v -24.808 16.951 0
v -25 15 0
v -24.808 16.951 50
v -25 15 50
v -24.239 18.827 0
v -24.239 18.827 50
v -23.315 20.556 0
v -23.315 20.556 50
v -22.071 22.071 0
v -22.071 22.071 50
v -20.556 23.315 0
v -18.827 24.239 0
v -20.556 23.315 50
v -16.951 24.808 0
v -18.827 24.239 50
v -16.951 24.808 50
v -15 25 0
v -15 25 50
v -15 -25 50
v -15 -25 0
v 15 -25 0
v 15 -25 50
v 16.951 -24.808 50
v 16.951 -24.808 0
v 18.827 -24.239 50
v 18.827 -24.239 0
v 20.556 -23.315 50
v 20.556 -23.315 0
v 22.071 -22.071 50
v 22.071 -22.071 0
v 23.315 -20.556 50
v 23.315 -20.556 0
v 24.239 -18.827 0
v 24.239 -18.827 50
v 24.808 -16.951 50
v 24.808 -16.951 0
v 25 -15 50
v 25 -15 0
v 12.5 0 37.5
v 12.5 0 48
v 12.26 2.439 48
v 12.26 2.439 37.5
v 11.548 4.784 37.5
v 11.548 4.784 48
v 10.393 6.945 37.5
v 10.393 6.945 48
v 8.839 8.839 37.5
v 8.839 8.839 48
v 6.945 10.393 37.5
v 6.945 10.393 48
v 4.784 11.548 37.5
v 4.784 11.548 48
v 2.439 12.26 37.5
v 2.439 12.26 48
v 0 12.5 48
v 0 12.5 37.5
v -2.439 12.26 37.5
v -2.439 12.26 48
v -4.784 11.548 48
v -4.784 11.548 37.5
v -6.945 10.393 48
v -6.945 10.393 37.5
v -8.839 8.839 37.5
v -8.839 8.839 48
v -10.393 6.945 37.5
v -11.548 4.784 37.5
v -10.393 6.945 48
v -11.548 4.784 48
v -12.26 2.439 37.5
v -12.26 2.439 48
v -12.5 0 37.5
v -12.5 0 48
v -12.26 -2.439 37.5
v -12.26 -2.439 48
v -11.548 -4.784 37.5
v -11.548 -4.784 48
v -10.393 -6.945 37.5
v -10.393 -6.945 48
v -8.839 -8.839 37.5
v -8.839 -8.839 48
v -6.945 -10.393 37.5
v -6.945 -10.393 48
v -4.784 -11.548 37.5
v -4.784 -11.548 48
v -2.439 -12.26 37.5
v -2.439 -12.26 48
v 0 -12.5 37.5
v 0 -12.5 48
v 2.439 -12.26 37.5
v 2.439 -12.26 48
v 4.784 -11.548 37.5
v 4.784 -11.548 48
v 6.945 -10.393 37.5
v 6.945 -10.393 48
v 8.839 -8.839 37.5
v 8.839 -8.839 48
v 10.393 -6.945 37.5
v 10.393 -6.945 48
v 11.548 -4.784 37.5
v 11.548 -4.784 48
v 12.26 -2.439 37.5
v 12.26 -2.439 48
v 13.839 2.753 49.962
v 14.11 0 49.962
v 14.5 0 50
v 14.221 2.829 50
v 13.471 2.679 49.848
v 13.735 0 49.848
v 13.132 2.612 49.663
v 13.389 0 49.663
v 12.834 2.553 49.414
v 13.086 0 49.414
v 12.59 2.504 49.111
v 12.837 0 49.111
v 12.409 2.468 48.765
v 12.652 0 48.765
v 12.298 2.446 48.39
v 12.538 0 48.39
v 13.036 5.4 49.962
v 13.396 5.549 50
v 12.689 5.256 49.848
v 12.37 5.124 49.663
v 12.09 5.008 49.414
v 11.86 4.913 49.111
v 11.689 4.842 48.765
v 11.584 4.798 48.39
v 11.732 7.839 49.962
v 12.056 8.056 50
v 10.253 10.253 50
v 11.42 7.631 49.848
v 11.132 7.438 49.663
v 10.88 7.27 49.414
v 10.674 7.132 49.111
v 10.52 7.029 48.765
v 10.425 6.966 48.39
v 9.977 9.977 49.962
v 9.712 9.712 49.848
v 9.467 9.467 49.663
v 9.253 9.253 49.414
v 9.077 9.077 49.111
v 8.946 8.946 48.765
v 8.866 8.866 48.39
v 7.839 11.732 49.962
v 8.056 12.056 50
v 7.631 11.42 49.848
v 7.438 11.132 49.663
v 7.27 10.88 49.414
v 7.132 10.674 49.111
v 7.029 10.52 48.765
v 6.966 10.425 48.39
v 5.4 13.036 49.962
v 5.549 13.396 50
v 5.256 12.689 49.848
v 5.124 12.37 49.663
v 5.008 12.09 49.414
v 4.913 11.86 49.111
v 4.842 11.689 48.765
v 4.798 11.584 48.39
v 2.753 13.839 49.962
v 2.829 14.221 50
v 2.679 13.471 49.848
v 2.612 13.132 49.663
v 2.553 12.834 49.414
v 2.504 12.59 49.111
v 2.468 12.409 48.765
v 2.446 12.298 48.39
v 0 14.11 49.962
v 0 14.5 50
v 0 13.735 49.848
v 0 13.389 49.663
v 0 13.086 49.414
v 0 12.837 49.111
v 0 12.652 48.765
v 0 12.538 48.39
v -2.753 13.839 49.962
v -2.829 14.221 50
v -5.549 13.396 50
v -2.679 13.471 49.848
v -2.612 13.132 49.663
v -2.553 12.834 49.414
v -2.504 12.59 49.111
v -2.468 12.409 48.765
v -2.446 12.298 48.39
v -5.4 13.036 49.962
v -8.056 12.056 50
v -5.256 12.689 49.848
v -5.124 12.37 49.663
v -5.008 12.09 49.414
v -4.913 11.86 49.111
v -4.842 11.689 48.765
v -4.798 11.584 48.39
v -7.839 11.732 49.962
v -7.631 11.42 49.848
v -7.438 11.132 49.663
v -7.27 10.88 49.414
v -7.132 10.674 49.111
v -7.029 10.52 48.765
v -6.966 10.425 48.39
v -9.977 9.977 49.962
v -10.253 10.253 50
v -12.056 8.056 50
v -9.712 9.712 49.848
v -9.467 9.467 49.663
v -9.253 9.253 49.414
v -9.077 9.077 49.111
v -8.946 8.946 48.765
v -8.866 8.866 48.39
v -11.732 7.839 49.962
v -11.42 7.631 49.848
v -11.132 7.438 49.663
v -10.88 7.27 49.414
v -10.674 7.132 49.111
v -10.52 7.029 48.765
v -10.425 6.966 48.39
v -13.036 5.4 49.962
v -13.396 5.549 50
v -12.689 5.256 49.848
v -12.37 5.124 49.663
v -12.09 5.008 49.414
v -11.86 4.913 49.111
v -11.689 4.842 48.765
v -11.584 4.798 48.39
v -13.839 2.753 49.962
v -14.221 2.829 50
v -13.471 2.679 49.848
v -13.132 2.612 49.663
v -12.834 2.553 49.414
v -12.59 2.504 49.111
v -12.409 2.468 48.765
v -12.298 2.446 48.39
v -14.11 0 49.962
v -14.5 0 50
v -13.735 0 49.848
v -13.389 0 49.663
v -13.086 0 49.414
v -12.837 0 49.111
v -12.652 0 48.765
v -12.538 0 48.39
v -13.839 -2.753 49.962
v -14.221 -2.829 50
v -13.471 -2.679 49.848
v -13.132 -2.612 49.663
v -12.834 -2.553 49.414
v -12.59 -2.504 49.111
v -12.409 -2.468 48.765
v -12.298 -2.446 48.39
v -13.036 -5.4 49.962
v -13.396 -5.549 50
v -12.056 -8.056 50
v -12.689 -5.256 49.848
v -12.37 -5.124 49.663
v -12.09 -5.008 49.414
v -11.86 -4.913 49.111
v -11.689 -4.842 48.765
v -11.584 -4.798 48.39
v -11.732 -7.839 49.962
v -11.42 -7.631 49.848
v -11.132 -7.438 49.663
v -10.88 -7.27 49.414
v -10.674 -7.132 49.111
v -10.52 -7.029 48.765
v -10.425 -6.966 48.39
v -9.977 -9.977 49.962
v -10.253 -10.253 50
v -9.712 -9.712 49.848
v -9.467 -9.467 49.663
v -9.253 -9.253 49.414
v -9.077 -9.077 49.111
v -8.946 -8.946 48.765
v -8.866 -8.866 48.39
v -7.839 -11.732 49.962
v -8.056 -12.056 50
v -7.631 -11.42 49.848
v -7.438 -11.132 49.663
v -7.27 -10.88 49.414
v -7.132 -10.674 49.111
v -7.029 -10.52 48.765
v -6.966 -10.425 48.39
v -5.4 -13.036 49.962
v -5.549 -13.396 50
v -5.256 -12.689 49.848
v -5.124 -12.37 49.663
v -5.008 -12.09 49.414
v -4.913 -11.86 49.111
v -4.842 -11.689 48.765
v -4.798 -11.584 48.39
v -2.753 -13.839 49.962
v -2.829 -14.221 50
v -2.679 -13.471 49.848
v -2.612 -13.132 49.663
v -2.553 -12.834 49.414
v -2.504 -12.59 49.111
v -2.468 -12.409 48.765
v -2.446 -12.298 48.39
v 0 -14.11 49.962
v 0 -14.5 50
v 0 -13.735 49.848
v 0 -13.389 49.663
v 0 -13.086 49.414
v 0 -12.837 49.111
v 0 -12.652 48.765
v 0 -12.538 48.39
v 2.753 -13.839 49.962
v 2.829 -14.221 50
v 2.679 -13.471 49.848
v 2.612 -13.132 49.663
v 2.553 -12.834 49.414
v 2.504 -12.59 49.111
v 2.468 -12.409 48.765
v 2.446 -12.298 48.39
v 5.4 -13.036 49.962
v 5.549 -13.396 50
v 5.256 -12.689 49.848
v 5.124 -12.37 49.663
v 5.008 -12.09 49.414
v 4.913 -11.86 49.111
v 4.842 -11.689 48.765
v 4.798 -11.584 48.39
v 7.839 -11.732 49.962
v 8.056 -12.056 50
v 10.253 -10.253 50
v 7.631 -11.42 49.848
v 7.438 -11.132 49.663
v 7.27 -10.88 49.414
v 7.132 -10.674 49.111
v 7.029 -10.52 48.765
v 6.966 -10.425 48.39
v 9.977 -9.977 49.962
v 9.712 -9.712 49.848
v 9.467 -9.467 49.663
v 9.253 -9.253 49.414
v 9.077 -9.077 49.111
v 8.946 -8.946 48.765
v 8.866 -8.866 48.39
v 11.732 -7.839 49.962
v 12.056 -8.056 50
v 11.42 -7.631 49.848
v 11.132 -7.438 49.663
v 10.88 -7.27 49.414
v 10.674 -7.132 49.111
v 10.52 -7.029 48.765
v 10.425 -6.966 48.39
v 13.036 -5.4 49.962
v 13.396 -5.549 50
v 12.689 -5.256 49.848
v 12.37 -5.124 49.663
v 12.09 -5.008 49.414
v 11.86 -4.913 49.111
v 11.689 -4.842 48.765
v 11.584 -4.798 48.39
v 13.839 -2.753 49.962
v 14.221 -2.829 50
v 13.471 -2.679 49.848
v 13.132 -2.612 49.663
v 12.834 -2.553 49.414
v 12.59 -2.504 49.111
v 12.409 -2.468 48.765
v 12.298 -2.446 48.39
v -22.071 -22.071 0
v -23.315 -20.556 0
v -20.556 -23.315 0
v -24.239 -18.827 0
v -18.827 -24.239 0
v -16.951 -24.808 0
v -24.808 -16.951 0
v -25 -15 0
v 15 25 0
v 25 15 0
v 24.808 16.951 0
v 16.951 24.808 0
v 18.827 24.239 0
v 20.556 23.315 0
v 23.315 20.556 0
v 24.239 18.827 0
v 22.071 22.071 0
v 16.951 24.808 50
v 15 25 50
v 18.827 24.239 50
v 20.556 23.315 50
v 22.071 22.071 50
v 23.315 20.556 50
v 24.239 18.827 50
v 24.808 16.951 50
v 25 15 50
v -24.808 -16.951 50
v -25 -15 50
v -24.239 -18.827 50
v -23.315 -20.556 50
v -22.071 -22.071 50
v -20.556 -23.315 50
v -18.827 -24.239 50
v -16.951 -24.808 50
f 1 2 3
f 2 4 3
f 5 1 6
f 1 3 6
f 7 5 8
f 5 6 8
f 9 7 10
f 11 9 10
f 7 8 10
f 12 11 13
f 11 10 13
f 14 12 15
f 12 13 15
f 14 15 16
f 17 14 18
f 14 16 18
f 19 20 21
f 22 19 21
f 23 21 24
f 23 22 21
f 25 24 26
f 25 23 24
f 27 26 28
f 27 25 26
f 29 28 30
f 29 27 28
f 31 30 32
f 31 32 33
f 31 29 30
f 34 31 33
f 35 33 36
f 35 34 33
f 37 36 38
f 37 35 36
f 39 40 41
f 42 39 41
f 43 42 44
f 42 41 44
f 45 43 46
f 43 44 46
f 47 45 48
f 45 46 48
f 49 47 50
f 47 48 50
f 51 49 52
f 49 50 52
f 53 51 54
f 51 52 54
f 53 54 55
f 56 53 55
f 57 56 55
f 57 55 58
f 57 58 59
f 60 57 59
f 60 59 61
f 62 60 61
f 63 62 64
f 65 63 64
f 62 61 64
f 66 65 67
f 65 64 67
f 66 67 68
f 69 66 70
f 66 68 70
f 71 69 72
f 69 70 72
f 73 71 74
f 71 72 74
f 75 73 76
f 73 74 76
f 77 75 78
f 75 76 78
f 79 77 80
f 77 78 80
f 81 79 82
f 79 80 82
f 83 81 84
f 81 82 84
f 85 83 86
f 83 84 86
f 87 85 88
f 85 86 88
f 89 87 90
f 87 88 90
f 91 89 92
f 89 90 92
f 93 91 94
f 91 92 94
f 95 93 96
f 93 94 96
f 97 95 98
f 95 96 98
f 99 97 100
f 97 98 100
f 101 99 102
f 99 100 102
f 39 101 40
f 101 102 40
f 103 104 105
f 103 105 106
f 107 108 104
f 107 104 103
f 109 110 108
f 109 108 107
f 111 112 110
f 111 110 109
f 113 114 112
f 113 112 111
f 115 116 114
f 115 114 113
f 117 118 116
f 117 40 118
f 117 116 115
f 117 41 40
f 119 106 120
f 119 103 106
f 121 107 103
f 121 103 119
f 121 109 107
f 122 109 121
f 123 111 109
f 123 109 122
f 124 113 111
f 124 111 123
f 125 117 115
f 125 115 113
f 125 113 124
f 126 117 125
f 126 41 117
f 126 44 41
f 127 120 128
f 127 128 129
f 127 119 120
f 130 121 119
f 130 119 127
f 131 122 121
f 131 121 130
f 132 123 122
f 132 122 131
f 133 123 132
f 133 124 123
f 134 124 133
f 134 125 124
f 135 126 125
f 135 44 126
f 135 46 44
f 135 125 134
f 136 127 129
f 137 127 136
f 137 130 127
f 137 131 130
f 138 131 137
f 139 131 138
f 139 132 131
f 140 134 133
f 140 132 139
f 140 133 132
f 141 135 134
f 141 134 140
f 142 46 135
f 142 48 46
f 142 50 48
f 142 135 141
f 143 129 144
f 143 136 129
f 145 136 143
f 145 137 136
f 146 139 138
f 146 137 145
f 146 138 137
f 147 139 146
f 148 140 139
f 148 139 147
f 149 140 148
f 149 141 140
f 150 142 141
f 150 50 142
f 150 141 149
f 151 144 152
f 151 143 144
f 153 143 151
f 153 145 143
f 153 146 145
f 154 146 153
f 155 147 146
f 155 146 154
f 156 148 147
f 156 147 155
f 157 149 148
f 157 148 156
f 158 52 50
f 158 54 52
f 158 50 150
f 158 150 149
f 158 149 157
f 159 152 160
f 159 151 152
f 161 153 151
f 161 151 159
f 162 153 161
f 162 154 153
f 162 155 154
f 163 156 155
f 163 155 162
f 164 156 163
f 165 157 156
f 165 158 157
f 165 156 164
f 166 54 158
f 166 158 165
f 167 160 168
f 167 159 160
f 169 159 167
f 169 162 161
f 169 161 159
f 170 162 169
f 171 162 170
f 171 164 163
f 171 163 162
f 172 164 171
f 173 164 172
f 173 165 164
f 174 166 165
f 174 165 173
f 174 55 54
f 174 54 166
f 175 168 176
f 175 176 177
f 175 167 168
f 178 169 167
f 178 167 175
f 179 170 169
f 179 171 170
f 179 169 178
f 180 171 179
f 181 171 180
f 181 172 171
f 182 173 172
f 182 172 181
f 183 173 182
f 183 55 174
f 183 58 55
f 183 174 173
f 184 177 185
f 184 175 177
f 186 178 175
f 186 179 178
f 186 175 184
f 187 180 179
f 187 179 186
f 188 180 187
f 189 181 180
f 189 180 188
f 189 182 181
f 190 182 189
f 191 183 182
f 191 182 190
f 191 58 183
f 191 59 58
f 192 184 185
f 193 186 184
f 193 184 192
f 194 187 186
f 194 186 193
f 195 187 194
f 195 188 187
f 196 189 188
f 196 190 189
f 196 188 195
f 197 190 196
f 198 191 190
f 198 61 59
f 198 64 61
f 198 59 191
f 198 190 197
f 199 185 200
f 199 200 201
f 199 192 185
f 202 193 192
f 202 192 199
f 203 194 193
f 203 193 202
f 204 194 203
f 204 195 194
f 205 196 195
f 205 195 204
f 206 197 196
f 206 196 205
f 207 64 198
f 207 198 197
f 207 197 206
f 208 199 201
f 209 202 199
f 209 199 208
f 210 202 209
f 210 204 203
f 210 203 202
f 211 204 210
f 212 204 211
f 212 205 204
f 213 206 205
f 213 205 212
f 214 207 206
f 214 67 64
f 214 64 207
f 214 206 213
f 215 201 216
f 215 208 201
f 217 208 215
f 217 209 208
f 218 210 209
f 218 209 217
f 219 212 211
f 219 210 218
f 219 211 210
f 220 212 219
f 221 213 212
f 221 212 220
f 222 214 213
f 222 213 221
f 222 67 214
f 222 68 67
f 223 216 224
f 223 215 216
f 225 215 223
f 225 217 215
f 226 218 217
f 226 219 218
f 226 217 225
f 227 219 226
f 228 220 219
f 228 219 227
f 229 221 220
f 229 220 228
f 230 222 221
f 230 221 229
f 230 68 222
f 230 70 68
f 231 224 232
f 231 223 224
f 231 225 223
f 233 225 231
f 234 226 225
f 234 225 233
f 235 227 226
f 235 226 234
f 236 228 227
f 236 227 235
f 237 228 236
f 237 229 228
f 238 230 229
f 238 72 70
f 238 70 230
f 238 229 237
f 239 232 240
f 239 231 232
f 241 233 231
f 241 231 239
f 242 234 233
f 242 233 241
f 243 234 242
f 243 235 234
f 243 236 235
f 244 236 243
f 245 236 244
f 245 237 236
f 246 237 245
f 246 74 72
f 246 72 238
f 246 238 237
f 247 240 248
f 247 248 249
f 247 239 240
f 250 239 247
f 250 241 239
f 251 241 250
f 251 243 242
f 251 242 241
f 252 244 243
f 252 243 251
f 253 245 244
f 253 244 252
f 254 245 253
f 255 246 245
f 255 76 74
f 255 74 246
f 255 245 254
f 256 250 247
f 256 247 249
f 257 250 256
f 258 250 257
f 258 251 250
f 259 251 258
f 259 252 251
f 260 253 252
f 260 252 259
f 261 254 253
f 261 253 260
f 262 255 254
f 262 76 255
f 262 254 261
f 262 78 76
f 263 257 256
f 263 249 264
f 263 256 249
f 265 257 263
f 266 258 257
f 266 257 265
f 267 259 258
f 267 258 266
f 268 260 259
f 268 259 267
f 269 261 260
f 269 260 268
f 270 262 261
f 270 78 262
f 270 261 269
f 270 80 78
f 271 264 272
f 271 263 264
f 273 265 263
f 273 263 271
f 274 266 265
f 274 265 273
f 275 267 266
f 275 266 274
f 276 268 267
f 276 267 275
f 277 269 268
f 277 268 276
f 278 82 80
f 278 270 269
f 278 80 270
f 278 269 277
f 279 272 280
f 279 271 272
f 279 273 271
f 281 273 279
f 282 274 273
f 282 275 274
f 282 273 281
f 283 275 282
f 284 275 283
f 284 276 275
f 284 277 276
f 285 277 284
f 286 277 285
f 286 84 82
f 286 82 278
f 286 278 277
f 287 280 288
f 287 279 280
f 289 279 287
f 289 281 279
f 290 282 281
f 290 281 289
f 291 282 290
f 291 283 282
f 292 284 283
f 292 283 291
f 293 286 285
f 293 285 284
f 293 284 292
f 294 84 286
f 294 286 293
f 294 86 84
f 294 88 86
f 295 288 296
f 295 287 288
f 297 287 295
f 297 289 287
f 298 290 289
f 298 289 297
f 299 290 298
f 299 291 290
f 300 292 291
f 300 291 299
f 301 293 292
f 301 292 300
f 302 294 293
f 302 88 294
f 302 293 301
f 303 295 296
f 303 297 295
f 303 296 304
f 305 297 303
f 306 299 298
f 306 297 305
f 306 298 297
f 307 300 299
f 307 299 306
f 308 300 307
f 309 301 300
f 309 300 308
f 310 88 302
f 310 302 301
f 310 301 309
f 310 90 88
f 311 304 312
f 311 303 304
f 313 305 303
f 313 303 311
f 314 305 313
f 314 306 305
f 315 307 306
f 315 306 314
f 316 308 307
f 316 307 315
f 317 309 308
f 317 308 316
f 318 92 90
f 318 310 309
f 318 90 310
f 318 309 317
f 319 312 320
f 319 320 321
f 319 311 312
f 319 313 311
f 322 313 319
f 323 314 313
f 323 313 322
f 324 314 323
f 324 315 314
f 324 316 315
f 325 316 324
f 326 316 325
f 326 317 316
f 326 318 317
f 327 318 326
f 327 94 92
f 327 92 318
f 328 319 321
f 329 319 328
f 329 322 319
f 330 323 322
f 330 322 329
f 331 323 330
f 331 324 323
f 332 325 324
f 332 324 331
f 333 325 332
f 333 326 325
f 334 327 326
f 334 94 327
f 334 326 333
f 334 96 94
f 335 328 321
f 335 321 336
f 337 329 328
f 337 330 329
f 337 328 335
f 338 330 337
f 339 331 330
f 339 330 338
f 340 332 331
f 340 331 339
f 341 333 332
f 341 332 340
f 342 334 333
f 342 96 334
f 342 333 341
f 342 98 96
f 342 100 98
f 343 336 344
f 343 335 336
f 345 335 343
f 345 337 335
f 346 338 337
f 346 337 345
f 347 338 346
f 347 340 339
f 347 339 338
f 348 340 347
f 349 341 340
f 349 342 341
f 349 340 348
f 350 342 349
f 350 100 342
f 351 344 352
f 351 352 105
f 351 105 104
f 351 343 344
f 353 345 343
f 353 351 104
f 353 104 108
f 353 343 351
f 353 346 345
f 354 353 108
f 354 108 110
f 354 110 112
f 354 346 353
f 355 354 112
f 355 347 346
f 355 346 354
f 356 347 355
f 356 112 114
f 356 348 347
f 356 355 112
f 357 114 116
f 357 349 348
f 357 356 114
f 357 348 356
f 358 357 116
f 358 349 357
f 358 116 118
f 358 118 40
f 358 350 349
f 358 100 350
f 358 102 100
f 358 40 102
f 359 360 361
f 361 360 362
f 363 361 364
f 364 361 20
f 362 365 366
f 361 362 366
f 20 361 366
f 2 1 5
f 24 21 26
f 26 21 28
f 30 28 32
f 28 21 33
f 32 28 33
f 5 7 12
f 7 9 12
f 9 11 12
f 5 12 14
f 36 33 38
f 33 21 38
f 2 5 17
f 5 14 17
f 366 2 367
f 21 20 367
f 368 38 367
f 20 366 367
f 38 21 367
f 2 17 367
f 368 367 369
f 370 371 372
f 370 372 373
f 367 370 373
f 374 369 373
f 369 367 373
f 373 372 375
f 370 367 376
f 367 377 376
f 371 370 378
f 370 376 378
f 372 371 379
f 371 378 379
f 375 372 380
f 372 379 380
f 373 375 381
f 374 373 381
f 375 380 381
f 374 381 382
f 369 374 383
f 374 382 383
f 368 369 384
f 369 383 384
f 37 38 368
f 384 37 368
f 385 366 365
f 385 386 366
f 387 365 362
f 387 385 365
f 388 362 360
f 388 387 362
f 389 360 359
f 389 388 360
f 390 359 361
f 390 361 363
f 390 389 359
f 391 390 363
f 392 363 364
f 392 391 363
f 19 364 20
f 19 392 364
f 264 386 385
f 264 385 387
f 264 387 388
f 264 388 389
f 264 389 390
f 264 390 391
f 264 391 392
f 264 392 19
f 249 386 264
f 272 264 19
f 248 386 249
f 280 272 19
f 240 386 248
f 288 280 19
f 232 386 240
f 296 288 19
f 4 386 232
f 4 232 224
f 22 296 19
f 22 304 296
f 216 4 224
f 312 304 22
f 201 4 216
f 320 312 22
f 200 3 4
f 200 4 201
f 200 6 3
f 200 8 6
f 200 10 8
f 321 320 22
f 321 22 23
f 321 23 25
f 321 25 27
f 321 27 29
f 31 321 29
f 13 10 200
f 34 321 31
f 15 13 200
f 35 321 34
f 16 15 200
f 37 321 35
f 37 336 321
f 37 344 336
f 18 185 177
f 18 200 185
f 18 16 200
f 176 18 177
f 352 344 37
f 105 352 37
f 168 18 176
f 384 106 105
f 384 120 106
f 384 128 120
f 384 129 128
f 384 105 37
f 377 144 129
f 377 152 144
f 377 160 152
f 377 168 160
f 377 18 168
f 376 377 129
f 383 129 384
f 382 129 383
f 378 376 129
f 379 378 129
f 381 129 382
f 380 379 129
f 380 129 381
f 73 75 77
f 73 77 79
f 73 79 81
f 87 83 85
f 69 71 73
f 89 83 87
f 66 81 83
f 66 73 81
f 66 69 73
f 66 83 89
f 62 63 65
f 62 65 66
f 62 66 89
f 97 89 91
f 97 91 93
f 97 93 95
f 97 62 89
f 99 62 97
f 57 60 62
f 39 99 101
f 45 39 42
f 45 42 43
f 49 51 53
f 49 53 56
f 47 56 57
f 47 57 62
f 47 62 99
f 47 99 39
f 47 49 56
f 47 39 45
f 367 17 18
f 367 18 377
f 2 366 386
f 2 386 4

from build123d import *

# Parameters (mm, degrees)
SKETCH_W     = 50
SKETCH_H     = 50
PAD_DEPTH    = 50
SKETCH001_R  = 12.5
POCKET_DEPTH = 12.5
FILLET_R     = 10
FILLET001_R  = 2


with BuildPart() as part:
    # Sketch → Pad (new body)
    with BuildSketch(Plane.XY):
        Rectangle(SKETCH_W, SKETCH_H)
    extrude(amount=PAD_DEPTH)

    # Sketch001 (on Face6 of Pad) → Pocket (cut)
    with BuildSketch(Plane.XY.offset(50)):
        Circle(SKETCH001_R)
    extrude(amount=-POCKET_DEPTH, mode=Mode.SUBTRACT)

    # Fillet
    fillet_edges = [part.edges().sort_by_distance(p)[0] for p in [
        (-25, -25, 25),
        (-25, 25, 25),
        (25, -25, 25),
        (25, 25, 25),
    ]]
    fillet(fillet_edges, radius=FILLET_R)

    # Fillet001
    fillet001_edges = [part.edges().sort_by_distance(p)[0] for p in [
        (-12.5, 0, 50),
    ]]
    fillet(fillet001_edges, radius=FILLET001_R)


solid = part.part
